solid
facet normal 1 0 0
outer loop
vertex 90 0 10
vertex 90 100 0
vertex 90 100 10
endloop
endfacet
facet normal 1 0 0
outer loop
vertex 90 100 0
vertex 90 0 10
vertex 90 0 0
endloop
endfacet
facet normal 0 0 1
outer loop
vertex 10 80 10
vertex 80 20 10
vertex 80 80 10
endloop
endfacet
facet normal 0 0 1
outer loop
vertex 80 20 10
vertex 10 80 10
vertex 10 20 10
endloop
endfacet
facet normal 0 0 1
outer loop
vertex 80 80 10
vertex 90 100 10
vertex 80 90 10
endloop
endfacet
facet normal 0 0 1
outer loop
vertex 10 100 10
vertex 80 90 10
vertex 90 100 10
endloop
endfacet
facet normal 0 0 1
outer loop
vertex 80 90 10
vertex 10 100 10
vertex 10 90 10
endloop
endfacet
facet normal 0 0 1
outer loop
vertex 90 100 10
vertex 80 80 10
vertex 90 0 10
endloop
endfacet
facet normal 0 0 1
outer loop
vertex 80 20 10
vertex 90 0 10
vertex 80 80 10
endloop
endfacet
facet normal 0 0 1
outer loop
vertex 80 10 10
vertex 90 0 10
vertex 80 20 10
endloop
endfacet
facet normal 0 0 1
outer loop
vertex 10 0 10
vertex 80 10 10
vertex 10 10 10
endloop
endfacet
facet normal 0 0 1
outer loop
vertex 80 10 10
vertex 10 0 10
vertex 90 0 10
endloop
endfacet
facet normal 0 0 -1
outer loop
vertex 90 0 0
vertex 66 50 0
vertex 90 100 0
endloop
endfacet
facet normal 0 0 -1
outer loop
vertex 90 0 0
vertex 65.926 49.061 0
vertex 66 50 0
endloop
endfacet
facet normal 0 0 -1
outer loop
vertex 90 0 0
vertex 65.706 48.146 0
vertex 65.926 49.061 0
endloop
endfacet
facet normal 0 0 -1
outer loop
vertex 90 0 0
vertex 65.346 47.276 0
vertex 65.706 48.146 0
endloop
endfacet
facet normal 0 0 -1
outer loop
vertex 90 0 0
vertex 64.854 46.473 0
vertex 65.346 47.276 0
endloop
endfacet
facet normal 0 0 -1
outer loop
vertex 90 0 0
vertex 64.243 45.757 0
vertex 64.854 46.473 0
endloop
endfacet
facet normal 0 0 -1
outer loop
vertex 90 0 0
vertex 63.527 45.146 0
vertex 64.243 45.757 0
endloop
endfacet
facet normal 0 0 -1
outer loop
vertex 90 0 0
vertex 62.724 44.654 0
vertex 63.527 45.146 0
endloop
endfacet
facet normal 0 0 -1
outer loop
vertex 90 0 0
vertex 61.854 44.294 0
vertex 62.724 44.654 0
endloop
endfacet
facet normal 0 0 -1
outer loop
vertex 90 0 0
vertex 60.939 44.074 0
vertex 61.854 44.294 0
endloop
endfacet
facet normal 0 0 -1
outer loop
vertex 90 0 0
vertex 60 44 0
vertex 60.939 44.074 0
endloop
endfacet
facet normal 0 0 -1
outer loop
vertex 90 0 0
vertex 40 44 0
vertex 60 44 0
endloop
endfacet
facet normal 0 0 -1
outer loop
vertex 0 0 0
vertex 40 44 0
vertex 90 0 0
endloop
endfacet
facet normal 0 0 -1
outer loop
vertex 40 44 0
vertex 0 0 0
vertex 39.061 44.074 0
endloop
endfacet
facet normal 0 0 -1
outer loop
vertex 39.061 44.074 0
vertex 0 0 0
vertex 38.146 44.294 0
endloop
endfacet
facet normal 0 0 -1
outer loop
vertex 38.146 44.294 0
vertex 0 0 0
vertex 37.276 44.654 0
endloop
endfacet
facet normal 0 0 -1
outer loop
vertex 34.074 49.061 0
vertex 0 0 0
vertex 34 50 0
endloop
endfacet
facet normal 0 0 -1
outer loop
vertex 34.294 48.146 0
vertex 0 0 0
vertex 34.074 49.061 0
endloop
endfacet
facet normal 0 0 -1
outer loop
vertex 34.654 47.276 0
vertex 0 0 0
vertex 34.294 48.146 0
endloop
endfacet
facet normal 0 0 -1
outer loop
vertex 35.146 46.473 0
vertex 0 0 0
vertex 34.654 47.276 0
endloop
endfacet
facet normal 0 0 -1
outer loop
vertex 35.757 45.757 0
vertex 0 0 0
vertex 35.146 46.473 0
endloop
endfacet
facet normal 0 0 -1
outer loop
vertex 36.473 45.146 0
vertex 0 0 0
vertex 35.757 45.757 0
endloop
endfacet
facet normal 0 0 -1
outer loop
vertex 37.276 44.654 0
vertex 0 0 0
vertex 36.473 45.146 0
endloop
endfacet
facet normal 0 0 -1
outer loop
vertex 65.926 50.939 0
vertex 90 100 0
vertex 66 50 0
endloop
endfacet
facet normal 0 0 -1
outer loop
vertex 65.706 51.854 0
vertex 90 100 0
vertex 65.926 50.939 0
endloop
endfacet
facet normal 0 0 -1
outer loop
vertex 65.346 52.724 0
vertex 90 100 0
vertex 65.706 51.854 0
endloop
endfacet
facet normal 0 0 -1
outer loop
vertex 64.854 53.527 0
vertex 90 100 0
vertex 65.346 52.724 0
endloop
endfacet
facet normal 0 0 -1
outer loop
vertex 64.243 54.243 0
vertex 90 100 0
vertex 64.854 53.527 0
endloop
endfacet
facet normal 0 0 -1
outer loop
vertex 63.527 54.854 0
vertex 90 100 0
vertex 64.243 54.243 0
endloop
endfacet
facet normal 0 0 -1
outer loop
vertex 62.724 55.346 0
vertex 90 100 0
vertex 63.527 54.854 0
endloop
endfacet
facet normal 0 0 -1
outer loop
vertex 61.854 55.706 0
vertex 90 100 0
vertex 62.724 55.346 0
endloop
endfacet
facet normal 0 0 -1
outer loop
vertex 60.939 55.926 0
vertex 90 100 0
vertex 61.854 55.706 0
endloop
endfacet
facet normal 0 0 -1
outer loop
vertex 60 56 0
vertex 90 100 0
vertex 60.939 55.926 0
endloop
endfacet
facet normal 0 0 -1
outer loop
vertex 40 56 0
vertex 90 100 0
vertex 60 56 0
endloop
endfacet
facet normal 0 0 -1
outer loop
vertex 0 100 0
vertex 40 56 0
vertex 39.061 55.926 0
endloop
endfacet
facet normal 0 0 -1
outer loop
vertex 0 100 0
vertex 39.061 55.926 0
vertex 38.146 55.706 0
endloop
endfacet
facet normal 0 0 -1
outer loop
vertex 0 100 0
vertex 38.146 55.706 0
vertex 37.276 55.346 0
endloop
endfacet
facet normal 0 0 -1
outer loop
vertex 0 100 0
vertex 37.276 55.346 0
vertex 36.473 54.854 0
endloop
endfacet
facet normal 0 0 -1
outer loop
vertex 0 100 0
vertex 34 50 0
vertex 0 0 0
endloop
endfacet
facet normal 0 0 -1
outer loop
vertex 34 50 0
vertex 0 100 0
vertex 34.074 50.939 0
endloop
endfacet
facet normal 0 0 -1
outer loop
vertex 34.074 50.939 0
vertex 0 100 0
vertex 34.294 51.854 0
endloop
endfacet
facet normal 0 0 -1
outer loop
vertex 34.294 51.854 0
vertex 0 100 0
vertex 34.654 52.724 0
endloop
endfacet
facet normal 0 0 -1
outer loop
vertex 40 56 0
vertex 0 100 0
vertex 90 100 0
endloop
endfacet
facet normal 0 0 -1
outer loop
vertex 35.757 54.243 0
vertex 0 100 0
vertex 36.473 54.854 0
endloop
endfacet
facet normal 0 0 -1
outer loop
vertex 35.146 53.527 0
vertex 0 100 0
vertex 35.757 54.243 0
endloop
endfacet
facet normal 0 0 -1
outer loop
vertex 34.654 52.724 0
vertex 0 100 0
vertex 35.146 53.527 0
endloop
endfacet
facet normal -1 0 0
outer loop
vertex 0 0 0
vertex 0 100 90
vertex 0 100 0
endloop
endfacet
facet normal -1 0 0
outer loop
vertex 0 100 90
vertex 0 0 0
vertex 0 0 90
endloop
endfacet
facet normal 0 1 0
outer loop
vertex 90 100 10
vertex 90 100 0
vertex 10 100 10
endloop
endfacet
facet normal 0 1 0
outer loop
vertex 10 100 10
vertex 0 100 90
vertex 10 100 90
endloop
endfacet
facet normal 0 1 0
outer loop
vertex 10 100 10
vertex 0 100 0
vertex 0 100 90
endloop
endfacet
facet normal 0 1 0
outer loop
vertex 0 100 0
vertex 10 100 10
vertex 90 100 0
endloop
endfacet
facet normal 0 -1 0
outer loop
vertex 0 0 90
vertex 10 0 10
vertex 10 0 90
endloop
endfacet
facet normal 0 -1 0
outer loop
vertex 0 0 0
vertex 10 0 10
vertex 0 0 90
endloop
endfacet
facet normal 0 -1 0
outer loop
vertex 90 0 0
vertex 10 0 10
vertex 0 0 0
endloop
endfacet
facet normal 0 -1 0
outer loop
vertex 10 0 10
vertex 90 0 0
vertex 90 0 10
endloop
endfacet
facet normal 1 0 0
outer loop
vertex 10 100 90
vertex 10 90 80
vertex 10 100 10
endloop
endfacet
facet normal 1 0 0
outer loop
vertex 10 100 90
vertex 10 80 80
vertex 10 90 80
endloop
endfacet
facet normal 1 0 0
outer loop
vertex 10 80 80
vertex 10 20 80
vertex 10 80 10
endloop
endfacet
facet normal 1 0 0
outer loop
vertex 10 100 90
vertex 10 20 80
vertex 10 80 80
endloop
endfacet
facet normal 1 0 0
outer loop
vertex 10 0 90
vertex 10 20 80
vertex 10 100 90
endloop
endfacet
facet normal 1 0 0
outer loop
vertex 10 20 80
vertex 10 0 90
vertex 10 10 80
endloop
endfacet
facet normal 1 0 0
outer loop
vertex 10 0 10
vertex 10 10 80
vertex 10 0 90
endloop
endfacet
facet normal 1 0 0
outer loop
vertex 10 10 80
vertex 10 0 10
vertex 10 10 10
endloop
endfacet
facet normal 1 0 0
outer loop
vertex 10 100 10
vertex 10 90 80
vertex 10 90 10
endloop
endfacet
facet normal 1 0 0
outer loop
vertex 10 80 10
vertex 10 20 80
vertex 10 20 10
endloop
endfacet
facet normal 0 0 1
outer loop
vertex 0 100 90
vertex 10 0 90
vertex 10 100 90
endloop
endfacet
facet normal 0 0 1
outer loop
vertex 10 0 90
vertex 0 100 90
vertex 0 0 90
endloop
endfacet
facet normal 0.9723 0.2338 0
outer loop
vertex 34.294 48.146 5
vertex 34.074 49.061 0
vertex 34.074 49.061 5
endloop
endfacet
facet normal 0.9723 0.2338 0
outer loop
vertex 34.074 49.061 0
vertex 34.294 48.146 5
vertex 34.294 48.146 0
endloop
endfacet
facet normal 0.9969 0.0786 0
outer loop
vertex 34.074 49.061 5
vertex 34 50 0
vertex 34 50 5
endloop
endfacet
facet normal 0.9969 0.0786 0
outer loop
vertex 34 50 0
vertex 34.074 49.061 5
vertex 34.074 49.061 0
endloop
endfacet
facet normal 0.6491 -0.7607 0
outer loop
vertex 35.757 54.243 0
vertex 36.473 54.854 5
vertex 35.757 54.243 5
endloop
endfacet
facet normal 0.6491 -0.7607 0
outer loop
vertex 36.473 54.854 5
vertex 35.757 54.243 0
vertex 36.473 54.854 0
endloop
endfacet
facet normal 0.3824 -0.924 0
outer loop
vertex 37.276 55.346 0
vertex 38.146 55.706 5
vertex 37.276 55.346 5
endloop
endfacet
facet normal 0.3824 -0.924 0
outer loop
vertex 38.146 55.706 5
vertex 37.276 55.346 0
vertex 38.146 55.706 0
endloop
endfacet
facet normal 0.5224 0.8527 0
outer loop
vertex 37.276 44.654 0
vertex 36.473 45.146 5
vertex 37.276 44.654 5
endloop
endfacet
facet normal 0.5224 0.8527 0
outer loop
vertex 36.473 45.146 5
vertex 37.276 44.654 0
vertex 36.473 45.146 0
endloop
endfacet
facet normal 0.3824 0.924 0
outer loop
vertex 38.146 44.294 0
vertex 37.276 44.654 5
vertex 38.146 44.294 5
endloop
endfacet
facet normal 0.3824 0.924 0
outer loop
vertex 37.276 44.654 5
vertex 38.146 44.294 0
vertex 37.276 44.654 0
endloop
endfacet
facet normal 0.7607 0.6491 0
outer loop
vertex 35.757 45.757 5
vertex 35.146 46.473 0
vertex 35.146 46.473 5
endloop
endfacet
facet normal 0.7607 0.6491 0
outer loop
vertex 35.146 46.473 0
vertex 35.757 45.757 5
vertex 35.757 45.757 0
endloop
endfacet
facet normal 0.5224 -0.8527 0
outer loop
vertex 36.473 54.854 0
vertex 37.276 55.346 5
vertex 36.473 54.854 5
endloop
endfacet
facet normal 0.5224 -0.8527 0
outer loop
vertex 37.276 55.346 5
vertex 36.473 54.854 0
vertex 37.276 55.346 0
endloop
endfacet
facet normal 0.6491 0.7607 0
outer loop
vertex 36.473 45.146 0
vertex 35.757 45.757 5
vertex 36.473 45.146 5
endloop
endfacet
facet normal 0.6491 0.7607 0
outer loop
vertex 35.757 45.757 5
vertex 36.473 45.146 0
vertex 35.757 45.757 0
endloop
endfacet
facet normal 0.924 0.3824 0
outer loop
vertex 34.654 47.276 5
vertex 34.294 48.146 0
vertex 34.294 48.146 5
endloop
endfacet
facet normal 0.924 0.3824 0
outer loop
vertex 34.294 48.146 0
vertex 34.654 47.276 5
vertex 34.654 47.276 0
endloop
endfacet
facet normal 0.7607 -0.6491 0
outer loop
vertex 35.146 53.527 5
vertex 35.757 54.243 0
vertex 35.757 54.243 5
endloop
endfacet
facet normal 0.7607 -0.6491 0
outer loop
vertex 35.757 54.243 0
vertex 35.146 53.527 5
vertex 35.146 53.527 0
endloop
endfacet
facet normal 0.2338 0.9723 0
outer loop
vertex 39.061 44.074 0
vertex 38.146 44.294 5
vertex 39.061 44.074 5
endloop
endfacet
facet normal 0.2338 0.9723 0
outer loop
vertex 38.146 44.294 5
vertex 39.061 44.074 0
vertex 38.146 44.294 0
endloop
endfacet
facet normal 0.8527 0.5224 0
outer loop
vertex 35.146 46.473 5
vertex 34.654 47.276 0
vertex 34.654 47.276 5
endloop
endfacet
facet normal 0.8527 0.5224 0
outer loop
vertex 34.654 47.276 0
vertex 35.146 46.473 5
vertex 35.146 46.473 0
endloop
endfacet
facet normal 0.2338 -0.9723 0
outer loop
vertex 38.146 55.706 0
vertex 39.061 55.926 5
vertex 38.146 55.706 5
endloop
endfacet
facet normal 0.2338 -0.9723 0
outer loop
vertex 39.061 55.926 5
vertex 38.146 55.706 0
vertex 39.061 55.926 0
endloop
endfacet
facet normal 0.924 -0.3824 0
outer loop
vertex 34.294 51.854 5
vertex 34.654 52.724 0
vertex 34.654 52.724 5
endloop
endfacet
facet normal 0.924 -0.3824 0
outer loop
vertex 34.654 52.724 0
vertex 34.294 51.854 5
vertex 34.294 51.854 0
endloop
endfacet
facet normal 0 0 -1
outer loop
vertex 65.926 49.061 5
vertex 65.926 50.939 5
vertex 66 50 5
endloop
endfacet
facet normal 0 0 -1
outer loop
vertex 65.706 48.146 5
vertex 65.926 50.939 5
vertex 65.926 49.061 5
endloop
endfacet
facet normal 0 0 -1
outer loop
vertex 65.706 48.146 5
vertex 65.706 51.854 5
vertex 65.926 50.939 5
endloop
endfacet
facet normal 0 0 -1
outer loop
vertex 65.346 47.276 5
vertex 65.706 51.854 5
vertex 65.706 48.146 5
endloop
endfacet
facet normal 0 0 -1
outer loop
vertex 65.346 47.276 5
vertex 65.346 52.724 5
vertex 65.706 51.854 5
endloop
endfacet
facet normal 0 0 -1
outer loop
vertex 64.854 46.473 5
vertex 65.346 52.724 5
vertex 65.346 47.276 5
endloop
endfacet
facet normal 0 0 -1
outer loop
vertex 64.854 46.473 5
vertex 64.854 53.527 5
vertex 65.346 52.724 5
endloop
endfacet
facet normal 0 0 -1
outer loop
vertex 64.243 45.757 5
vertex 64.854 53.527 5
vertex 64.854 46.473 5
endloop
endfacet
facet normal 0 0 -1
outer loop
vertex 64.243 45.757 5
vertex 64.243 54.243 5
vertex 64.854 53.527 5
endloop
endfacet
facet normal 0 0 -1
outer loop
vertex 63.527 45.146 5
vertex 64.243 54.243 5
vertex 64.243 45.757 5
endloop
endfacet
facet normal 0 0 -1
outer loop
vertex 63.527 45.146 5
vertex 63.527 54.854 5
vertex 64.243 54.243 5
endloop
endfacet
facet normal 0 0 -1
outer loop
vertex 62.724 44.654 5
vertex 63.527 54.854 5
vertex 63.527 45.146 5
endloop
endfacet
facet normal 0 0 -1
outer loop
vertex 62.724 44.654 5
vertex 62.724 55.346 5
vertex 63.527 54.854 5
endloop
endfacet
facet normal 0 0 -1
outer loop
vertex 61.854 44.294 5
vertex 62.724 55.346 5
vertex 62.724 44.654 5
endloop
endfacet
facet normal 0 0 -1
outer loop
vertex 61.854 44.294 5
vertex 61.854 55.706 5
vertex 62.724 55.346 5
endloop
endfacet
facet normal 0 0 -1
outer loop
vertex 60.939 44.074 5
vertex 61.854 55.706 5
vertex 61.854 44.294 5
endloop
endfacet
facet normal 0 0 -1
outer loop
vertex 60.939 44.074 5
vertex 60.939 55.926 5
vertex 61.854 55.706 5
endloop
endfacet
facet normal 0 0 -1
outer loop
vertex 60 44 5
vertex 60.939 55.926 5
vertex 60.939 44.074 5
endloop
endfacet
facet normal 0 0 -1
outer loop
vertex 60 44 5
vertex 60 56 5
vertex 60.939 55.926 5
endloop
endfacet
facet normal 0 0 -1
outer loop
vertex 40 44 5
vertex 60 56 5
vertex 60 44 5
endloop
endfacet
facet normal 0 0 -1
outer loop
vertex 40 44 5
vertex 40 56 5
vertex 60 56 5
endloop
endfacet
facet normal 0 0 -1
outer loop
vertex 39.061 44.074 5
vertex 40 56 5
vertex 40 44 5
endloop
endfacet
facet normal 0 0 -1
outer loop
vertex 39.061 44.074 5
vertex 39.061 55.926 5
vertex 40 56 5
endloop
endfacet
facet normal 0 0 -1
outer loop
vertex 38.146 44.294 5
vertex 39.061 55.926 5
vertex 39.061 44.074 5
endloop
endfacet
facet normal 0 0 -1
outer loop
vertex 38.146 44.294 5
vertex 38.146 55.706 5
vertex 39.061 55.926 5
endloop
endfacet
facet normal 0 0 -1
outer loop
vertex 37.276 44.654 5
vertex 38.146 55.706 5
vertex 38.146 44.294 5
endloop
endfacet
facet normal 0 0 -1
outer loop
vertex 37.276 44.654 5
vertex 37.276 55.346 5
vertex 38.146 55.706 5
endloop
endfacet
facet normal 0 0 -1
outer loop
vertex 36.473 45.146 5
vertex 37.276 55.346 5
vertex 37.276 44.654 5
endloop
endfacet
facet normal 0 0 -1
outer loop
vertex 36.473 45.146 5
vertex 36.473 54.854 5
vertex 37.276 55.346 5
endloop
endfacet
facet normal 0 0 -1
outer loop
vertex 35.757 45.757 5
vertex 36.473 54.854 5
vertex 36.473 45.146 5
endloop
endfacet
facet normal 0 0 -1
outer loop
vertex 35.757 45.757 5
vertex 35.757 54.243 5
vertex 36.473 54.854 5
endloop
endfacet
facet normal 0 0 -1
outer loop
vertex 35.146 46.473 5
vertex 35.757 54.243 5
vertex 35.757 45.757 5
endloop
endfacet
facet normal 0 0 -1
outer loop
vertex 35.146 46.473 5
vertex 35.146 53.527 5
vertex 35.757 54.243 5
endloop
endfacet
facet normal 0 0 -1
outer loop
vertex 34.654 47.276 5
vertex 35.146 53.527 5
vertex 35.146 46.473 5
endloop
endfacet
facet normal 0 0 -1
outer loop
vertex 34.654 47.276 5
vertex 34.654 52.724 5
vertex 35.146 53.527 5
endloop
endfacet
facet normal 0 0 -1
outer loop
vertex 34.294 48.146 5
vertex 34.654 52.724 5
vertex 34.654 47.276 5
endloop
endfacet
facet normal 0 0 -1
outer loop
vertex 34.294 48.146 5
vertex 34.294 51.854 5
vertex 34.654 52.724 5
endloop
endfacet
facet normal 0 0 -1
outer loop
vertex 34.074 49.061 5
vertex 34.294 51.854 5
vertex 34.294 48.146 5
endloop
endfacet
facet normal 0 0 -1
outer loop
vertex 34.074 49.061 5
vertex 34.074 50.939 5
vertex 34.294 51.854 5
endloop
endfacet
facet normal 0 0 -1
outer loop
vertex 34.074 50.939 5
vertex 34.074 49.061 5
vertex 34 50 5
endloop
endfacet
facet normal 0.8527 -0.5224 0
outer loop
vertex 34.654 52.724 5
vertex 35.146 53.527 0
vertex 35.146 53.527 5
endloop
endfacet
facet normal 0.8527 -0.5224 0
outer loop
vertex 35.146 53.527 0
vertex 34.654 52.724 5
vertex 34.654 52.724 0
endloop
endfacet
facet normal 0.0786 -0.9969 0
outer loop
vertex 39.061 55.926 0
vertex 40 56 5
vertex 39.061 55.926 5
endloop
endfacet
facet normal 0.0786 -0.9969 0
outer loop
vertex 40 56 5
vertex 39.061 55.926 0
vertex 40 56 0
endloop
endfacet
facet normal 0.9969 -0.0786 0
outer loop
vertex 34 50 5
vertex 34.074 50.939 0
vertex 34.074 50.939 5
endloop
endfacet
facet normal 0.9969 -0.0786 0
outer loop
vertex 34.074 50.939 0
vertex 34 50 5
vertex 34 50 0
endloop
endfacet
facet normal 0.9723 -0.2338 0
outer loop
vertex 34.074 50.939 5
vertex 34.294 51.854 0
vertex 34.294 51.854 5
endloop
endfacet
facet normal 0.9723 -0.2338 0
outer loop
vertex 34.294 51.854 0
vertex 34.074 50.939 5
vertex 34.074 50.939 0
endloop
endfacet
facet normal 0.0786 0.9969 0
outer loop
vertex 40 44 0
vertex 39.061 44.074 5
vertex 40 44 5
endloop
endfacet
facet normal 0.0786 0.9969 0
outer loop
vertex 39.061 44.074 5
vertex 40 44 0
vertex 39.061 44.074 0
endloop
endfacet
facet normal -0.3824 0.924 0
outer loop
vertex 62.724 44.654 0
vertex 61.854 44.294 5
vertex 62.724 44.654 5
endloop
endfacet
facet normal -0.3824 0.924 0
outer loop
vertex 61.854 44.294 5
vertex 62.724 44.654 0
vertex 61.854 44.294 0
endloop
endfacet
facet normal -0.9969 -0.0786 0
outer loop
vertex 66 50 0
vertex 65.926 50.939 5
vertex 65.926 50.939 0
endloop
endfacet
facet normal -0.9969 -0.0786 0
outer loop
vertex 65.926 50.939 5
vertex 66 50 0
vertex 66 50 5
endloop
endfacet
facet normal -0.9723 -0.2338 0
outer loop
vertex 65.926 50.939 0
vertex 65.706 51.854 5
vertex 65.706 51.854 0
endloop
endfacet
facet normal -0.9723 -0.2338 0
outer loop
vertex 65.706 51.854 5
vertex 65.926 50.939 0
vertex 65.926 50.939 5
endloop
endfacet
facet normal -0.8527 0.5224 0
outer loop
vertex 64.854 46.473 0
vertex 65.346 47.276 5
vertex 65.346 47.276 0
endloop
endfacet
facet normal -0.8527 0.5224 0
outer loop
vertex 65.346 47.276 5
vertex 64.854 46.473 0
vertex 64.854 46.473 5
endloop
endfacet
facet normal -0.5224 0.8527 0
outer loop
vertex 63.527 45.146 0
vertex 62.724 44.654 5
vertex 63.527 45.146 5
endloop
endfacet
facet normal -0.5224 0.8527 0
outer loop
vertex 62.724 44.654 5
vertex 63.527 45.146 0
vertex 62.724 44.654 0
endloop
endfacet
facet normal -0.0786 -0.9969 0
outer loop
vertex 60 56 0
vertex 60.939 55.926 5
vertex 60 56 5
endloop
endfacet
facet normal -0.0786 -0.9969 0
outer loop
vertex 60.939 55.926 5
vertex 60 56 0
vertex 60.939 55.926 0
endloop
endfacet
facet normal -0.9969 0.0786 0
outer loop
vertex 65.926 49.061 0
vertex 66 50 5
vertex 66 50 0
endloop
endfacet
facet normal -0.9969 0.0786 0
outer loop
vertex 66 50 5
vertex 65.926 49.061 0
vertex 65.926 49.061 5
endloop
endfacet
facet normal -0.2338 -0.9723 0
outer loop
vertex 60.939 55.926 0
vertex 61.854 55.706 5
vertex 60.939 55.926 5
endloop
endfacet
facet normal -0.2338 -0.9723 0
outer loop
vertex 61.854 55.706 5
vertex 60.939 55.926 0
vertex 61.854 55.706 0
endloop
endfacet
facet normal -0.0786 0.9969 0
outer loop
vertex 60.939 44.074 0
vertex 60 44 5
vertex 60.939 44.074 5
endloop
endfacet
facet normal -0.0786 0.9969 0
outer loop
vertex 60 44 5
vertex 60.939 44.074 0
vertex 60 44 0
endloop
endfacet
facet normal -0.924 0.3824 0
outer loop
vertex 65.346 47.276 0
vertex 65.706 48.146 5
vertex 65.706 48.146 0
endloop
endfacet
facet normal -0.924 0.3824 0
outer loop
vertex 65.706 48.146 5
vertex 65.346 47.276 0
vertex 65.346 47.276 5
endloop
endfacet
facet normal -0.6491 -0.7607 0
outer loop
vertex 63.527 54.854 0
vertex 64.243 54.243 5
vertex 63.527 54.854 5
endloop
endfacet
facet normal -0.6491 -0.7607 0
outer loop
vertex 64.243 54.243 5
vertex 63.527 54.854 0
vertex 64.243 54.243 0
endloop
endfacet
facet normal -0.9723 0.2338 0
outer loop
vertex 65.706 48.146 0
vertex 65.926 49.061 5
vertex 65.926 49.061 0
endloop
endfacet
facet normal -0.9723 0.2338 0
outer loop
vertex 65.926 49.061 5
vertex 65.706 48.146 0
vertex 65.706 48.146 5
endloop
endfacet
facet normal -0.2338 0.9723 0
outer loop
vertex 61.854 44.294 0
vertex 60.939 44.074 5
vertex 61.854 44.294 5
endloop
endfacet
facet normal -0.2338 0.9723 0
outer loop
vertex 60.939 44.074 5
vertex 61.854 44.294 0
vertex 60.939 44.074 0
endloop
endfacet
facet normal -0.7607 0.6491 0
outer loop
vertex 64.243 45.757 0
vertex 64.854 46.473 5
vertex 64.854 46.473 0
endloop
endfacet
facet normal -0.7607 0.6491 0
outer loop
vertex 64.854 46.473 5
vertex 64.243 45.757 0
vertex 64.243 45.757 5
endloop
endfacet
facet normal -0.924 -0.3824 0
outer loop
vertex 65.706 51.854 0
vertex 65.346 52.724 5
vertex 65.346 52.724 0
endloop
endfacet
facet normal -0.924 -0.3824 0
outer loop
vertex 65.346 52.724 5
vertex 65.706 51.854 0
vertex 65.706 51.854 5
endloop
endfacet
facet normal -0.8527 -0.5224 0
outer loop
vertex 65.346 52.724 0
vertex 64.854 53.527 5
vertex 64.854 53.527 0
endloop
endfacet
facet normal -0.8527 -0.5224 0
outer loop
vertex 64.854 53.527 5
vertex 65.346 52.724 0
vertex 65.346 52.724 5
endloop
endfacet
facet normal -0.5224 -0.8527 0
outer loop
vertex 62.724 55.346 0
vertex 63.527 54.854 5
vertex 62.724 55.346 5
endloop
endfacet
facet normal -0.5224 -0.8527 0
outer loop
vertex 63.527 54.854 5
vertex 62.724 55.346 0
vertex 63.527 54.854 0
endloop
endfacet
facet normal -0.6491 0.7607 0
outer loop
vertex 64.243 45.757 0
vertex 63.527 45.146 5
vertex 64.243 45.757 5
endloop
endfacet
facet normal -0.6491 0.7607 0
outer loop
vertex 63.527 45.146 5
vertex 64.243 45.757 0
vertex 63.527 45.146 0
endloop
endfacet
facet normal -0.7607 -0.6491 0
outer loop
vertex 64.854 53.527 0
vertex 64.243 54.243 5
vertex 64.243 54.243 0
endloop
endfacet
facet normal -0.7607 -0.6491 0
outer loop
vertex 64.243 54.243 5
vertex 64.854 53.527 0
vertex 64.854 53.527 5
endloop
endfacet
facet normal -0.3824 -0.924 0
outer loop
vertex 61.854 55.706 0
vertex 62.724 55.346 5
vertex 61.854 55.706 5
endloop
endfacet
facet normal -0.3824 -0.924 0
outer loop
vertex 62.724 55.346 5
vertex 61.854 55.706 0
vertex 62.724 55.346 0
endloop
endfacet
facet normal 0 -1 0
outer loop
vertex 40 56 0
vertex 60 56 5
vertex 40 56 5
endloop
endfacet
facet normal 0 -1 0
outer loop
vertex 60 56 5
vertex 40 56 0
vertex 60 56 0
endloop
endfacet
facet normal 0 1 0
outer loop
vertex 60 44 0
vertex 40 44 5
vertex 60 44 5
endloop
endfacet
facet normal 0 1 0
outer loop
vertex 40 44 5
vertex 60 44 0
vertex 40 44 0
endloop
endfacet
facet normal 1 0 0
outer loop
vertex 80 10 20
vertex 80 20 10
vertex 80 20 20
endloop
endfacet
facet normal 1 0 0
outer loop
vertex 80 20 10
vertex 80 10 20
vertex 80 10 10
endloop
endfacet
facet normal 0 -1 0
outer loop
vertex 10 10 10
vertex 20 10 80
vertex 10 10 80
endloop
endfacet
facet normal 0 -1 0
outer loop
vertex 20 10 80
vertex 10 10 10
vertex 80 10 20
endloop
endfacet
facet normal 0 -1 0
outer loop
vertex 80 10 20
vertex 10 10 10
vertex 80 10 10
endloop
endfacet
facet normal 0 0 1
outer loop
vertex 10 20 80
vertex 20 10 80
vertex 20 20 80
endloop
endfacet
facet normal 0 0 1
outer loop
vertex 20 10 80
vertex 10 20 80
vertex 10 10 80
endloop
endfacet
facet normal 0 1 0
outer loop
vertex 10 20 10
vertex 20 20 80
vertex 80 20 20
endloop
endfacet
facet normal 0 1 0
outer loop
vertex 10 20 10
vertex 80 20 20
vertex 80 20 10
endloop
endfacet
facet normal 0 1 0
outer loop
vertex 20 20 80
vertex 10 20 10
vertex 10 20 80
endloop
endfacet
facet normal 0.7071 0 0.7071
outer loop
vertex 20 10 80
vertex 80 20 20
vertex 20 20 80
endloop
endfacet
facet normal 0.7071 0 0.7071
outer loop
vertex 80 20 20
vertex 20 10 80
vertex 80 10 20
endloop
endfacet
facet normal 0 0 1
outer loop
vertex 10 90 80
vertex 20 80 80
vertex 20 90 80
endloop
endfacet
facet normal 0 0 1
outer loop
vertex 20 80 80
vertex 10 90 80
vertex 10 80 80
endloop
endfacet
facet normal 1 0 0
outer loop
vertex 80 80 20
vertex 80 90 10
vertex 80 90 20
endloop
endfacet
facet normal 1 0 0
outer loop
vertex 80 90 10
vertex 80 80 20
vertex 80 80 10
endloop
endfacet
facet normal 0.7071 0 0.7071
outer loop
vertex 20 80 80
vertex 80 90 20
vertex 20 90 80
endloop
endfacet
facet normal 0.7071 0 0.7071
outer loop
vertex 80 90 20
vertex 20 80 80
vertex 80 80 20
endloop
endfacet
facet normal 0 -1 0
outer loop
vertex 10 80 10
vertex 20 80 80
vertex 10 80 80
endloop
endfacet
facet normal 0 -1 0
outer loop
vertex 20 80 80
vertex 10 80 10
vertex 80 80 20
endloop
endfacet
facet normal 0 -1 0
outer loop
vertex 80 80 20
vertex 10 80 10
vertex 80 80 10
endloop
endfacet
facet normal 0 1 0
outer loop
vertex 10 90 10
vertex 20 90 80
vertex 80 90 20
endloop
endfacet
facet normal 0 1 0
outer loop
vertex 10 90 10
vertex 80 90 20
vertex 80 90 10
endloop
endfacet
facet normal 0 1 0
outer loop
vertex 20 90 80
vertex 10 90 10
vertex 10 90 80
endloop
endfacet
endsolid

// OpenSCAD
// file: mirror_copy.scad
module mirror_copy(vector=[1,0,0]){
    children();
    mirror(vector) children();
}
// file: slot.scad
use <mirror_copy.scad>
slot(d=6.5,l=1,h=10,centre=false);

module slot(d=10,l=50,h=10,help=false,centre=true){
    if(help)echo("slot(d=10,l=50,h=10)");
    mirror_copy([1,0,0]) translate([-l/2,0,-0.1]) cylinder(h=h+0.2,d=d,$fn=40,center=centre);
    if(centre)
        cube([l,d,h],center=centre);
    else
        translate([0,-d/2,0])cube([l,d,h],center=centre);
}
 
// main file
use <slot.scad>
use <mirror_copy.scad>

bracket();

module bracket(w=80,d=100,h=80,t=10,sd=12,sl=20) {
    difference(){
        union(){
            cube([w+t,d,t]);  //base
            cube([t,d,h+t]);  //upright
        }
        translate([w/2+t,d/2,-1]) slot(sd,sl,t+2);
    }
    translate([0,d/2,0]) gusset(w,d,h,t);
}
module gusset(w,d,h,t){
    path=[[0,0],[w-t,0],[w-t,t],[t,h-t],[0,h-t]];
    rotate([90,0,0]) mirror_copy([0,0,1]) translate([t,t,d/2-2*t]) linear_extrude(t) polygon(path);
    }
